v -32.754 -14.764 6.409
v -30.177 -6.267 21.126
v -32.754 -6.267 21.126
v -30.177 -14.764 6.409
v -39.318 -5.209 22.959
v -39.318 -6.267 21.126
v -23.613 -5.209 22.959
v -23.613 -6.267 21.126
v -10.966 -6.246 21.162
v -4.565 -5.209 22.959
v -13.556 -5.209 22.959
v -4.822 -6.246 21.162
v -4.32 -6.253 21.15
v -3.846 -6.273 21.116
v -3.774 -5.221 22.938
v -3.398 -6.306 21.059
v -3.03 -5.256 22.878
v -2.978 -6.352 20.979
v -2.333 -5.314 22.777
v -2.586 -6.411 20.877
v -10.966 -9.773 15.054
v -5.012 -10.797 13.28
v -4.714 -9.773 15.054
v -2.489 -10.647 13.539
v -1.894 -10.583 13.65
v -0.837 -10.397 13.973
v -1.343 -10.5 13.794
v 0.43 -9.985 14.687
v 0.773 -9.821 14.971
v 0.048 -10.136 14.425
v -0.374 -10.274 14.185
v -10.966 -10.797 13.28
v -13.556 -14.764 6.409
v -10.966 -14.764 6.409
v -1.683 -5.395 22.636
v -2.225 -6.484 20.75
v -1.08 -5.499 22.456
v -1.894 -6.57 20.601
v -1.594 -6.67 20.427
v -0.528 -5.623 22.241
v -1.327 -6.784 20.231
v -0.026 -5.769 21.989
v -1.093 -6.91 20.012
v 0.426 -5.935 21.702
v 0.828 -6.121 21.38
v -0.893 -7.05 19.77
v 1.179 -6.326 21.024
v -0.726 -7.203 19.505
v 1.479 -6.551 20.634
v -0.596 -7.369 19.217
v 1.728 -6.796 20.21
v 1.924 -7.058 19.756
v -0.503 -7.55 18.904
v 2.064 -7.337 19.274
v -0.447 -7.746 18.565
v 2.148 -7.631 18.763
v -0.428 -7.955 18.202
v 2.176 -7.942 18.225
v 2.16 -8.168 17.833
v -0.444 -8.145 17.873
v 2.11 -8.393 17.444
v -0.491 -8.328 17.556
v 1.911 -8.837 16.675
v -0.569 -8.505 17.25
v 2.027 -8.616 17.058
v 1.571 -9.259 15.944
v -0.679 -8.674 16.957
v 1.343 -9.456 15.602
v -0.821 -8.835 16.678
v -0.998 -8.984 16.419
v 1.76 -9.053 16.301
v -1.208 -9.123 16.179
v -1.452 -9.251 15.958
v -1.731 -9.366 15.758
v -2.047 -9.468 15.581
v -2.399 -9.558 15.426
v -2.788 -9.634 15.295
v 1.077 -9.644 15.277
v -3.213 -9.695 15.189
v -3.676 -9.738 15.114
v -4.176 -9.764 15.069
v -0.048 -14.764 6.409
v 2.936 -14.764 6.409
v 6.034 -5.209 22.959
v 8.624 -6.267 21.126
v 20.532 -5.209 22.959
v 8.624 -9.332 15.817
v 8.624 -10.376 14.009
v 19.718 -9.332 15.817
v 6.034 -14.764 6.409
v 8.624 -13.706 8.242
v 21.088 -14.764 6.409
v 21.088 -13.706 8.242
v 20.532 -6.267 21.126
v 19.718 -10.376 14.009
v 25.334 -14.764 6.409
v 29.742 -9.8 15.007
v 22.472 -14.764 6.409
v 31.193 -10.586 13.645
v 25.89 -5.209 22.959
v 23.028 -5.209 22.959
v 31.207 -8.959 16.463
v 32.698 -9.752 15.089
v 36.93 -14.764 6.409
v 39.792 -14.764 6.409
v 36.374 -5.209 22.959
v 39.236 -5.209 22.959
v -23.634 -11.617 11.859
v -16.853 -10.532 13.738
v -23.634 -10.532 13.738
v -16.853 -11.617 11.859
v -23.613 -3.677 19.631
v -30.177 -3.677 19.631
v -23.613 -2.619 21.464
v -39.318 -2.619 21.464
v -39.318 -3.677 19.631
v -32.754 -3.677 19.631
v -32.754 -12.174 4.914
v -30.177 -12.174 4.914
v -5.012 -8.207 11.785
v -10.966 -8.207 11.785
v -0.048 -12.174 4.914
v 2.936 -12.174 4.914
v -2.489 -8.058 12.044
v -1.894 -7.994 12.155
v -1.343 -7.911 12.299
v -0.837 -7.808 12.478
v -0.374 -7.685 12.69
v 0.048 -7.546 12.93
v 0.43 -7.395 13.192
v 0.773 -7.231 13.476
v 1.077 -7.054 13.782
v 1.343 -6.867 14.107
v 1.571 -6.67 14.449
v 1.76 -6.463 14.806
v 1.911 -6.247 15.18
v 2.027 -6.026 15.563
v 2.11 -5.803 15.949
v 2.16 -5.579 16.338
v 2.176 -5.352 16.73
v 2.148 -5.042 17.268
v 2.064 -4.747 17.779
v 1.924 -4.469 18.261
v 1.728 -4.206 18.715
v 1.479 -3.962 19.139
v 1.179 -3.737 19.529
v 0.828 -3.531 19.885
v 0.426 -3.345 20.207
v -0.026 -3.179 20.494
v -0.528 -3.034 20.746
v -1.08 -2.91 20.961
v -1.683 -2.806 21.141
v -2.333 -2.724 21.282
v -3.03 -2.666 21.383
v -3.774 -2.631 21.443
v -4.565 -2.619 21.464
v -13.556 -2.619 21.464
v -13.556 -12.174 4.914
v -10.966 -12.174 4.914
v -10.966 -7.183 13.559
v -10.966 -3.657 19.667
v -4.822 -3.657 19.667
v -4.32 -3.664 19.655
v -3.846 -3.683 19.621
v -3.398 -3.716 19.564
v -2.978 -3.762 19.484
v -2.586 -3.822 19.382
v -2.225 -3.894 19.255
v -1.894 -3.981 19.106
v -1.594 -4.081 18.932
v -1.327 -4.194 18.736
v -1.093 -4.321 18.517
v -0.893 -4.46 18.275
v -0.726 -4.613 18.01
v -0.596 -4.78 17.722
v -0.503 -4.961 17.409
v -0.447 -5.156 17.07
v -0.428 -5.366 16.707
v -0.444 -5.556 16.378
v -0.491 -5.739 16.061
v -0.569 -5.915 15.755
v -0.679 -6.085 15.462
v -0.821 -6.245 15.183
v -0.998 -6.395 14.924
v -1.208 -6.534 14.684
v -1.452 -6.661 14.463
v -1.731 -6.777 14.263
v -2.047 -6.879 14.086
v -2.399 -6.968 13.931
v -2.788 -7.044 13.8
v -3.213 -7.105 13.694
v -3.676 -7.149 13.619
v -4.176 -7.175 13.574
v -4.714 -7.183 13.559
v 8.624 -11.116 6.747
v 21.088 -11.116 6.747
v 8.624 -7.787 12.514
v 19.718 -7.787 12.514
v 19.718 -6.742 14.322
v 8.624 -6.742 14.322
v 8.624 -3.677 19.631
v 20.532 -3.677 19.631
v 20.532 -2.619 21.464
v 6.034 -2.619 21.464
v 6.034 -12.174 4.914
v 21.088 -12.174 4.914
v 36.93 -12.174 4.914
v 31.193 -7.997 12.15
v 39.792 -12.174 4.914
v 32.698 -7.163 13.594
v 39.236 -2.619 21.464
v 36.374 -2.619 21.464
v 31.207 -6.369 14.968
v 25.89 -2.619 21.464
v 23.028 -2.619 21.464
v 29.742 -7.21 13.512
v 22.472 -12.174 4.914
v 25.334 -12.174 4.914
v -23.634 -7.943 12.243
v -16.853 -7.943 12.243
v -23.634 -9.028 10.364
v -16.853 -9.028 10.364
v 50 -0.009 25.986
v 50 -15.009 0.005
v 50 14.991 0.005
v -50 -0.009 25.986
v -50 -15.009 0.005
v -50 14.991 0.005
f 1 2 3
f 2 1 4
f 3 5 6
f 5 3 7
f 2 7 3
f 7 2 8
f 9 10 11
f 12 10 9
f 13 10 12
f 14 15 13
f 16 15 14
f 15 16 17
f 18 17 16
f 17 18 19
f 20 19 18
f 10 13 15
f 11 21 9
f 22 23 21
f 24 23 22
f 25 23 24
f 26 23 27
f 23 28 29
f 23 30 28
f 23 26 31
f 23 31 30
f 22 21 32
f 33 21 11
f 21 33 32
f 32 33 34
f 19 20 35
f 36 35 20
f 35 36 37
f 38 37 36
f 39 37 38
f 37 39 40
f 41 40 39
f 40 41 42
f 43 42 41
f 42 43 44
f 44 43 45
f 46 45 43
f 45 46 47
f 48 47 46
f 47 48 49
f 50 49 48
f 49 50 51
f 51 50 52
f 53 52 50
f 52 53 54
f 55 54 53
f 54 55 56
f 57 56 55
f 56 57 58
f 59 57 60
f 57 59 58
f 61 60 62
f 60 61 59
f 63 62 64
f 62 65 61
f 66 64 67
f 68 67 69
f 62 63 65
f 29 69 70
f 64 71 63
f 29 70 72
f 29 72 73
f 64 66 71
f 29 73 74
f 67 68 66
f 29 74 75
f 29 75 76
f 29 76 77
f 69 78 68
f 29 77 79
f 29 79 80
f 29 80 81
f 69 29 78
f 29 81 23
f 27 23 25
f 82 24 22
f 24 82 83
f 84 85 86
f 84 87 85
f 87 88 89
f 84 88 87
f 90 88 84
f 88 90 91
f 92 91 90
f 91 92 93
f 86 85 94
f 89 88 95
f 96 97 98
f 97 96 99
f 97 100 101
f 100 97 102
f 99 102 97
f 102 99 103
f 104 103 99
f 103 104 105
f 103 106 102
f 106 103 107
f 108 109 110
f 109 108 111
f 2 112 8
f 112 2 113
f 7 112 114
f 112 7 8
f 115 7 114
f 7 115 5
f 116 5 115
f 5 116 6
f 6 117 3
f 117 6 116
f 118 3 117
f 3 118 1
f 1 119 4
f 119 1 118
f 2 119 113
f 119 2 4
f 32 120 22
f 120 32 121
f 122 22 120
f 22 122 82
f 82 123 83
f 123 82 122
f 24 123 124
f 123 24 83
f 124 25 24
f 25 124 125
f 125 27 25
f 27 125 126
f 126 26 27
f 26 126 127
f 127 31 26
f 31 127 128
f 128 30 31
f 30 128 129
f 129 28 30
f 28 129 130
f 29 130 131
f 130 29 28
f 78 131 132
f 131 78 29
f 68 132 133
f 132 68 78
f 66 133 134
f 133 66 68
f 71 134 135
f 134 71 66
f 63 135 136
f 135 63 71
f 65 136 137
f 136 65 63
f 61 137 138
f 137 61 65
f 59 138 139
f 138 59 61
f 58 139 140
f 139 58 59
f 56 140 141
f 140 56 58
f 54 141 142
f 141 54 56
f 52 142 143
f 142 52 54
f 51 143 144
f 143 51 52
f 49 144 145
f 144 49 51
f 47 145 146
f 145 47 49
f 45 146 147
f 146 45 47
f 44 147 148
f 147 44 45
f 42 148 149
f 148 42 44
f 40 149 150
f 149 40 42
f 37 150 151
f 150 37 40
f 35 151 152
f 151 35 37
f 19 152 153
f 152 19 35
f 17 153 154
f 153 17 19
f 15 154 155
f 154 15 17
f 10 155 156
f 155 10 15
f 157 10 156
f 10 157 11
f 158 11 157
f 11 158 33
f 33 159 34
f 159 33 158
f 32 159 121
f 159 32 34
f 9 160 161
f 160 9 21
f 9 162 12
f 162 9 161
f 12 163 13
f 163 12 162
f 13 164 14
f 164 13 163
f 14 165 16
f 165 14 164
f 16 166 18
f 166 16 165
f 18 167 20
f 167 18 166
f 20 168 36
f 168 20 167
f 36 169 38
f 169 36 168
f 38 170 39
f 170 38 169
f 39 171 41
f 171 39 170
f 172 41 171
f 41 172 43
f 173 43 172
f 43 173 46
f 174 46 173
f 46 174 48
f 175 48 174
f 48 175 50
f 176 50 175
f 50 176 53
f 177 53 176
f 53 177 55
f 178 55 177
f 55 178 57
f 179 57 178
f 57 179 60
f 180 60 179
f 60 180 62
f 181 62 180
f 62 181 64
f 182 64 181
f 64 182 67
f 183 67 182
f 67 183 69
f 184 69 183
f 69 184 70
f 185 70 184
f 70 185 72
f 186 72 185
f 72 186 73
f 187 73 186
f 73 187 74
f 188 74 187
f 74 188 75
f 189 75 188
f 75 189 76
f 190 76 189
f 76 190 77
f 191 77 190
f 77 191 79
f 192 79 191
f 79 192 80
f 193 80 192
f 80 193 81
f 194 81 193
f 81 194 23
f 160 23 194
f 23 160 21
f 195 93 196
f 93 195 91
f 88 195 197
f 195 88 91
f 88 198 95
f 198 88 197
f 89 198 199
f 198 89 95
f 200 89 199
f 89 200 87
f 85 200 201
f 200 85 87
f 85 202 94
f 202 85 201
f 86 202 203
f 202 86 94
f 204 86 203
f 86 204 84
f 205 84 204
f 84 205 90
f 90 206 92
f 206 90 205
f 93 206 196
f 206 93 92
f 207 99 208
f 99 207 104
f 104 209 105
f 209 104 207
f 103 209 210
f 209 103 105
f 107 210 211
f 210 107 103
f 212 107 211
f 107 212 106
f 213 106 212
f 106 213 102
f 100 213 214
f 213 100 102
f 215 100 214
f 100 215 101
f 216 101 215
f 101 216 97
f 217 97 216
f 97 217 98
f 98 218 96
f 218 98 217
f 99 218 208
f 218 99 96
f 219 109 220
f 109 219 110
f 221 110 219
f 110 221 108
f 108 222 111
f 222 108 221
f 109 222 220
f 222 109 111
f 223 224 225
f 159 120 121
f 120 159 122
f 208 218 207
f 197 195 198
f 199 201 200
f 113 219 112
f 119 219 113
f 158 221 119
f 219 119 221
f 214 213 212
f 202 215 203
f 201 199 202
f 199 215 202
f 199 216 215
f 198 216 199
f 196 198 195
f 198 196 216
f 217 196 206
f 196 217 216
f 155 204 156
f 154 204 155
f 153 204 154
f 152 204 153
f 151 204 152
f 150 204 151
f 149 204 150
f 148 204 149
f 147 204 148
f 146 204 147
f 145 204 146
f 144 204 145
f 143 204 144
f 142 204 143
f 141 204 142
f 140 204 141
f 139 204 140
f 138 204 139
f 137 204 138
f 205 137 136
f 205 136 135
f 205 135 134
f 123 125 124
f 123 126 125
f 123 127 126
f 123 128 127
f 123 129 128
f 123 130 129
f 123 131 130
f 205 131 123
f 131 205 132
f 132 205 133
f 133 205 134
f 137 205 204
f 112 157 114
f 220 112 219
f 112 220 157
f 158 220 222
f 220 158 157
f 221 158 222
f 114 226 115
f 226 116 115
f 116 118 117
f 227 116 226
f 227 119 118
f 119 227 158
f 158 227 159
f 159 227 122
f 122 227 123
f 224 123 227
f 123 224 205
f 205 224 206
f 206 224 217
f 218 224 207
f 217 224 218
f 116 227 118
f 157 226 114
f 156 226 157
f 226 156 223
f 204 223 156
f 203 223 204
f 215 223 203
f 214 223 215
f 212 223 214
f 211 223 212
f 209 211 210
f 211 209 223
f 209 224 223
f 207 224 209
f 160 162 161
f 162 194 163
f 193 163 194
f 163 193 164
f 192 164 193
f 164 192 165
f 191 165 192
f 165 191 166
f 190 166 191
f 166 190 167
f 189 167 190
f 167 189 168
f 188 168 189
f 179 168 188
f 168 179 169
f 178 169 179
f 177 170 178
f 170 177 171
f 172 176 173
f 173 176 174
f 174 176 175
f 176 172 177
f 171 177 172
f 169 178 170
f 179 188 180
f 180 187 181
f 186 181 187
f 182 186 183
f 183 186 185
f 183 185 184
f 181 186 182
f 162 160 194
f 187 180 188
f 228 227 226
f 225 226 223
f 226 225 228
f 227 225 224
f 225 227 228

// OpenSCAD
SLEN = 30;
LEN = 100;
Y = sqrt((SLEN * SLEN) - (SLEN/2)*(SLEN/2));
X = tan(30) * (SLEN/2);

TSIZE = 20;
TEXTH = 3;

module base() {
    translate([-LEN/2,-SLEN/2,(TEXTH)-0.01]) {
      rotate([90,0,90]) {
        linear_extrude(LEN) {
        polygon([ [0,0], [SLEN,0], [SLEN/2, Y]] );
      }
    }
  }
}

module txt(T) {
  mirror() {
    linear_extrude(TEXTH) {
      text(T, size=TSIZE, halign="center", valign="center");
    }
  }      
}

//------------------------------------------------------
echo("Y is", Y);
echo("X is", X);
rotate([0,0,180]) {
  translate([0,0, X]) {
    rotate([120,0,0]) {
      translate([0,0, -(TEXTH + X)]) {
        color("blue") txt("T-REX");
        color("white") base();
      }
    }
  }
}
